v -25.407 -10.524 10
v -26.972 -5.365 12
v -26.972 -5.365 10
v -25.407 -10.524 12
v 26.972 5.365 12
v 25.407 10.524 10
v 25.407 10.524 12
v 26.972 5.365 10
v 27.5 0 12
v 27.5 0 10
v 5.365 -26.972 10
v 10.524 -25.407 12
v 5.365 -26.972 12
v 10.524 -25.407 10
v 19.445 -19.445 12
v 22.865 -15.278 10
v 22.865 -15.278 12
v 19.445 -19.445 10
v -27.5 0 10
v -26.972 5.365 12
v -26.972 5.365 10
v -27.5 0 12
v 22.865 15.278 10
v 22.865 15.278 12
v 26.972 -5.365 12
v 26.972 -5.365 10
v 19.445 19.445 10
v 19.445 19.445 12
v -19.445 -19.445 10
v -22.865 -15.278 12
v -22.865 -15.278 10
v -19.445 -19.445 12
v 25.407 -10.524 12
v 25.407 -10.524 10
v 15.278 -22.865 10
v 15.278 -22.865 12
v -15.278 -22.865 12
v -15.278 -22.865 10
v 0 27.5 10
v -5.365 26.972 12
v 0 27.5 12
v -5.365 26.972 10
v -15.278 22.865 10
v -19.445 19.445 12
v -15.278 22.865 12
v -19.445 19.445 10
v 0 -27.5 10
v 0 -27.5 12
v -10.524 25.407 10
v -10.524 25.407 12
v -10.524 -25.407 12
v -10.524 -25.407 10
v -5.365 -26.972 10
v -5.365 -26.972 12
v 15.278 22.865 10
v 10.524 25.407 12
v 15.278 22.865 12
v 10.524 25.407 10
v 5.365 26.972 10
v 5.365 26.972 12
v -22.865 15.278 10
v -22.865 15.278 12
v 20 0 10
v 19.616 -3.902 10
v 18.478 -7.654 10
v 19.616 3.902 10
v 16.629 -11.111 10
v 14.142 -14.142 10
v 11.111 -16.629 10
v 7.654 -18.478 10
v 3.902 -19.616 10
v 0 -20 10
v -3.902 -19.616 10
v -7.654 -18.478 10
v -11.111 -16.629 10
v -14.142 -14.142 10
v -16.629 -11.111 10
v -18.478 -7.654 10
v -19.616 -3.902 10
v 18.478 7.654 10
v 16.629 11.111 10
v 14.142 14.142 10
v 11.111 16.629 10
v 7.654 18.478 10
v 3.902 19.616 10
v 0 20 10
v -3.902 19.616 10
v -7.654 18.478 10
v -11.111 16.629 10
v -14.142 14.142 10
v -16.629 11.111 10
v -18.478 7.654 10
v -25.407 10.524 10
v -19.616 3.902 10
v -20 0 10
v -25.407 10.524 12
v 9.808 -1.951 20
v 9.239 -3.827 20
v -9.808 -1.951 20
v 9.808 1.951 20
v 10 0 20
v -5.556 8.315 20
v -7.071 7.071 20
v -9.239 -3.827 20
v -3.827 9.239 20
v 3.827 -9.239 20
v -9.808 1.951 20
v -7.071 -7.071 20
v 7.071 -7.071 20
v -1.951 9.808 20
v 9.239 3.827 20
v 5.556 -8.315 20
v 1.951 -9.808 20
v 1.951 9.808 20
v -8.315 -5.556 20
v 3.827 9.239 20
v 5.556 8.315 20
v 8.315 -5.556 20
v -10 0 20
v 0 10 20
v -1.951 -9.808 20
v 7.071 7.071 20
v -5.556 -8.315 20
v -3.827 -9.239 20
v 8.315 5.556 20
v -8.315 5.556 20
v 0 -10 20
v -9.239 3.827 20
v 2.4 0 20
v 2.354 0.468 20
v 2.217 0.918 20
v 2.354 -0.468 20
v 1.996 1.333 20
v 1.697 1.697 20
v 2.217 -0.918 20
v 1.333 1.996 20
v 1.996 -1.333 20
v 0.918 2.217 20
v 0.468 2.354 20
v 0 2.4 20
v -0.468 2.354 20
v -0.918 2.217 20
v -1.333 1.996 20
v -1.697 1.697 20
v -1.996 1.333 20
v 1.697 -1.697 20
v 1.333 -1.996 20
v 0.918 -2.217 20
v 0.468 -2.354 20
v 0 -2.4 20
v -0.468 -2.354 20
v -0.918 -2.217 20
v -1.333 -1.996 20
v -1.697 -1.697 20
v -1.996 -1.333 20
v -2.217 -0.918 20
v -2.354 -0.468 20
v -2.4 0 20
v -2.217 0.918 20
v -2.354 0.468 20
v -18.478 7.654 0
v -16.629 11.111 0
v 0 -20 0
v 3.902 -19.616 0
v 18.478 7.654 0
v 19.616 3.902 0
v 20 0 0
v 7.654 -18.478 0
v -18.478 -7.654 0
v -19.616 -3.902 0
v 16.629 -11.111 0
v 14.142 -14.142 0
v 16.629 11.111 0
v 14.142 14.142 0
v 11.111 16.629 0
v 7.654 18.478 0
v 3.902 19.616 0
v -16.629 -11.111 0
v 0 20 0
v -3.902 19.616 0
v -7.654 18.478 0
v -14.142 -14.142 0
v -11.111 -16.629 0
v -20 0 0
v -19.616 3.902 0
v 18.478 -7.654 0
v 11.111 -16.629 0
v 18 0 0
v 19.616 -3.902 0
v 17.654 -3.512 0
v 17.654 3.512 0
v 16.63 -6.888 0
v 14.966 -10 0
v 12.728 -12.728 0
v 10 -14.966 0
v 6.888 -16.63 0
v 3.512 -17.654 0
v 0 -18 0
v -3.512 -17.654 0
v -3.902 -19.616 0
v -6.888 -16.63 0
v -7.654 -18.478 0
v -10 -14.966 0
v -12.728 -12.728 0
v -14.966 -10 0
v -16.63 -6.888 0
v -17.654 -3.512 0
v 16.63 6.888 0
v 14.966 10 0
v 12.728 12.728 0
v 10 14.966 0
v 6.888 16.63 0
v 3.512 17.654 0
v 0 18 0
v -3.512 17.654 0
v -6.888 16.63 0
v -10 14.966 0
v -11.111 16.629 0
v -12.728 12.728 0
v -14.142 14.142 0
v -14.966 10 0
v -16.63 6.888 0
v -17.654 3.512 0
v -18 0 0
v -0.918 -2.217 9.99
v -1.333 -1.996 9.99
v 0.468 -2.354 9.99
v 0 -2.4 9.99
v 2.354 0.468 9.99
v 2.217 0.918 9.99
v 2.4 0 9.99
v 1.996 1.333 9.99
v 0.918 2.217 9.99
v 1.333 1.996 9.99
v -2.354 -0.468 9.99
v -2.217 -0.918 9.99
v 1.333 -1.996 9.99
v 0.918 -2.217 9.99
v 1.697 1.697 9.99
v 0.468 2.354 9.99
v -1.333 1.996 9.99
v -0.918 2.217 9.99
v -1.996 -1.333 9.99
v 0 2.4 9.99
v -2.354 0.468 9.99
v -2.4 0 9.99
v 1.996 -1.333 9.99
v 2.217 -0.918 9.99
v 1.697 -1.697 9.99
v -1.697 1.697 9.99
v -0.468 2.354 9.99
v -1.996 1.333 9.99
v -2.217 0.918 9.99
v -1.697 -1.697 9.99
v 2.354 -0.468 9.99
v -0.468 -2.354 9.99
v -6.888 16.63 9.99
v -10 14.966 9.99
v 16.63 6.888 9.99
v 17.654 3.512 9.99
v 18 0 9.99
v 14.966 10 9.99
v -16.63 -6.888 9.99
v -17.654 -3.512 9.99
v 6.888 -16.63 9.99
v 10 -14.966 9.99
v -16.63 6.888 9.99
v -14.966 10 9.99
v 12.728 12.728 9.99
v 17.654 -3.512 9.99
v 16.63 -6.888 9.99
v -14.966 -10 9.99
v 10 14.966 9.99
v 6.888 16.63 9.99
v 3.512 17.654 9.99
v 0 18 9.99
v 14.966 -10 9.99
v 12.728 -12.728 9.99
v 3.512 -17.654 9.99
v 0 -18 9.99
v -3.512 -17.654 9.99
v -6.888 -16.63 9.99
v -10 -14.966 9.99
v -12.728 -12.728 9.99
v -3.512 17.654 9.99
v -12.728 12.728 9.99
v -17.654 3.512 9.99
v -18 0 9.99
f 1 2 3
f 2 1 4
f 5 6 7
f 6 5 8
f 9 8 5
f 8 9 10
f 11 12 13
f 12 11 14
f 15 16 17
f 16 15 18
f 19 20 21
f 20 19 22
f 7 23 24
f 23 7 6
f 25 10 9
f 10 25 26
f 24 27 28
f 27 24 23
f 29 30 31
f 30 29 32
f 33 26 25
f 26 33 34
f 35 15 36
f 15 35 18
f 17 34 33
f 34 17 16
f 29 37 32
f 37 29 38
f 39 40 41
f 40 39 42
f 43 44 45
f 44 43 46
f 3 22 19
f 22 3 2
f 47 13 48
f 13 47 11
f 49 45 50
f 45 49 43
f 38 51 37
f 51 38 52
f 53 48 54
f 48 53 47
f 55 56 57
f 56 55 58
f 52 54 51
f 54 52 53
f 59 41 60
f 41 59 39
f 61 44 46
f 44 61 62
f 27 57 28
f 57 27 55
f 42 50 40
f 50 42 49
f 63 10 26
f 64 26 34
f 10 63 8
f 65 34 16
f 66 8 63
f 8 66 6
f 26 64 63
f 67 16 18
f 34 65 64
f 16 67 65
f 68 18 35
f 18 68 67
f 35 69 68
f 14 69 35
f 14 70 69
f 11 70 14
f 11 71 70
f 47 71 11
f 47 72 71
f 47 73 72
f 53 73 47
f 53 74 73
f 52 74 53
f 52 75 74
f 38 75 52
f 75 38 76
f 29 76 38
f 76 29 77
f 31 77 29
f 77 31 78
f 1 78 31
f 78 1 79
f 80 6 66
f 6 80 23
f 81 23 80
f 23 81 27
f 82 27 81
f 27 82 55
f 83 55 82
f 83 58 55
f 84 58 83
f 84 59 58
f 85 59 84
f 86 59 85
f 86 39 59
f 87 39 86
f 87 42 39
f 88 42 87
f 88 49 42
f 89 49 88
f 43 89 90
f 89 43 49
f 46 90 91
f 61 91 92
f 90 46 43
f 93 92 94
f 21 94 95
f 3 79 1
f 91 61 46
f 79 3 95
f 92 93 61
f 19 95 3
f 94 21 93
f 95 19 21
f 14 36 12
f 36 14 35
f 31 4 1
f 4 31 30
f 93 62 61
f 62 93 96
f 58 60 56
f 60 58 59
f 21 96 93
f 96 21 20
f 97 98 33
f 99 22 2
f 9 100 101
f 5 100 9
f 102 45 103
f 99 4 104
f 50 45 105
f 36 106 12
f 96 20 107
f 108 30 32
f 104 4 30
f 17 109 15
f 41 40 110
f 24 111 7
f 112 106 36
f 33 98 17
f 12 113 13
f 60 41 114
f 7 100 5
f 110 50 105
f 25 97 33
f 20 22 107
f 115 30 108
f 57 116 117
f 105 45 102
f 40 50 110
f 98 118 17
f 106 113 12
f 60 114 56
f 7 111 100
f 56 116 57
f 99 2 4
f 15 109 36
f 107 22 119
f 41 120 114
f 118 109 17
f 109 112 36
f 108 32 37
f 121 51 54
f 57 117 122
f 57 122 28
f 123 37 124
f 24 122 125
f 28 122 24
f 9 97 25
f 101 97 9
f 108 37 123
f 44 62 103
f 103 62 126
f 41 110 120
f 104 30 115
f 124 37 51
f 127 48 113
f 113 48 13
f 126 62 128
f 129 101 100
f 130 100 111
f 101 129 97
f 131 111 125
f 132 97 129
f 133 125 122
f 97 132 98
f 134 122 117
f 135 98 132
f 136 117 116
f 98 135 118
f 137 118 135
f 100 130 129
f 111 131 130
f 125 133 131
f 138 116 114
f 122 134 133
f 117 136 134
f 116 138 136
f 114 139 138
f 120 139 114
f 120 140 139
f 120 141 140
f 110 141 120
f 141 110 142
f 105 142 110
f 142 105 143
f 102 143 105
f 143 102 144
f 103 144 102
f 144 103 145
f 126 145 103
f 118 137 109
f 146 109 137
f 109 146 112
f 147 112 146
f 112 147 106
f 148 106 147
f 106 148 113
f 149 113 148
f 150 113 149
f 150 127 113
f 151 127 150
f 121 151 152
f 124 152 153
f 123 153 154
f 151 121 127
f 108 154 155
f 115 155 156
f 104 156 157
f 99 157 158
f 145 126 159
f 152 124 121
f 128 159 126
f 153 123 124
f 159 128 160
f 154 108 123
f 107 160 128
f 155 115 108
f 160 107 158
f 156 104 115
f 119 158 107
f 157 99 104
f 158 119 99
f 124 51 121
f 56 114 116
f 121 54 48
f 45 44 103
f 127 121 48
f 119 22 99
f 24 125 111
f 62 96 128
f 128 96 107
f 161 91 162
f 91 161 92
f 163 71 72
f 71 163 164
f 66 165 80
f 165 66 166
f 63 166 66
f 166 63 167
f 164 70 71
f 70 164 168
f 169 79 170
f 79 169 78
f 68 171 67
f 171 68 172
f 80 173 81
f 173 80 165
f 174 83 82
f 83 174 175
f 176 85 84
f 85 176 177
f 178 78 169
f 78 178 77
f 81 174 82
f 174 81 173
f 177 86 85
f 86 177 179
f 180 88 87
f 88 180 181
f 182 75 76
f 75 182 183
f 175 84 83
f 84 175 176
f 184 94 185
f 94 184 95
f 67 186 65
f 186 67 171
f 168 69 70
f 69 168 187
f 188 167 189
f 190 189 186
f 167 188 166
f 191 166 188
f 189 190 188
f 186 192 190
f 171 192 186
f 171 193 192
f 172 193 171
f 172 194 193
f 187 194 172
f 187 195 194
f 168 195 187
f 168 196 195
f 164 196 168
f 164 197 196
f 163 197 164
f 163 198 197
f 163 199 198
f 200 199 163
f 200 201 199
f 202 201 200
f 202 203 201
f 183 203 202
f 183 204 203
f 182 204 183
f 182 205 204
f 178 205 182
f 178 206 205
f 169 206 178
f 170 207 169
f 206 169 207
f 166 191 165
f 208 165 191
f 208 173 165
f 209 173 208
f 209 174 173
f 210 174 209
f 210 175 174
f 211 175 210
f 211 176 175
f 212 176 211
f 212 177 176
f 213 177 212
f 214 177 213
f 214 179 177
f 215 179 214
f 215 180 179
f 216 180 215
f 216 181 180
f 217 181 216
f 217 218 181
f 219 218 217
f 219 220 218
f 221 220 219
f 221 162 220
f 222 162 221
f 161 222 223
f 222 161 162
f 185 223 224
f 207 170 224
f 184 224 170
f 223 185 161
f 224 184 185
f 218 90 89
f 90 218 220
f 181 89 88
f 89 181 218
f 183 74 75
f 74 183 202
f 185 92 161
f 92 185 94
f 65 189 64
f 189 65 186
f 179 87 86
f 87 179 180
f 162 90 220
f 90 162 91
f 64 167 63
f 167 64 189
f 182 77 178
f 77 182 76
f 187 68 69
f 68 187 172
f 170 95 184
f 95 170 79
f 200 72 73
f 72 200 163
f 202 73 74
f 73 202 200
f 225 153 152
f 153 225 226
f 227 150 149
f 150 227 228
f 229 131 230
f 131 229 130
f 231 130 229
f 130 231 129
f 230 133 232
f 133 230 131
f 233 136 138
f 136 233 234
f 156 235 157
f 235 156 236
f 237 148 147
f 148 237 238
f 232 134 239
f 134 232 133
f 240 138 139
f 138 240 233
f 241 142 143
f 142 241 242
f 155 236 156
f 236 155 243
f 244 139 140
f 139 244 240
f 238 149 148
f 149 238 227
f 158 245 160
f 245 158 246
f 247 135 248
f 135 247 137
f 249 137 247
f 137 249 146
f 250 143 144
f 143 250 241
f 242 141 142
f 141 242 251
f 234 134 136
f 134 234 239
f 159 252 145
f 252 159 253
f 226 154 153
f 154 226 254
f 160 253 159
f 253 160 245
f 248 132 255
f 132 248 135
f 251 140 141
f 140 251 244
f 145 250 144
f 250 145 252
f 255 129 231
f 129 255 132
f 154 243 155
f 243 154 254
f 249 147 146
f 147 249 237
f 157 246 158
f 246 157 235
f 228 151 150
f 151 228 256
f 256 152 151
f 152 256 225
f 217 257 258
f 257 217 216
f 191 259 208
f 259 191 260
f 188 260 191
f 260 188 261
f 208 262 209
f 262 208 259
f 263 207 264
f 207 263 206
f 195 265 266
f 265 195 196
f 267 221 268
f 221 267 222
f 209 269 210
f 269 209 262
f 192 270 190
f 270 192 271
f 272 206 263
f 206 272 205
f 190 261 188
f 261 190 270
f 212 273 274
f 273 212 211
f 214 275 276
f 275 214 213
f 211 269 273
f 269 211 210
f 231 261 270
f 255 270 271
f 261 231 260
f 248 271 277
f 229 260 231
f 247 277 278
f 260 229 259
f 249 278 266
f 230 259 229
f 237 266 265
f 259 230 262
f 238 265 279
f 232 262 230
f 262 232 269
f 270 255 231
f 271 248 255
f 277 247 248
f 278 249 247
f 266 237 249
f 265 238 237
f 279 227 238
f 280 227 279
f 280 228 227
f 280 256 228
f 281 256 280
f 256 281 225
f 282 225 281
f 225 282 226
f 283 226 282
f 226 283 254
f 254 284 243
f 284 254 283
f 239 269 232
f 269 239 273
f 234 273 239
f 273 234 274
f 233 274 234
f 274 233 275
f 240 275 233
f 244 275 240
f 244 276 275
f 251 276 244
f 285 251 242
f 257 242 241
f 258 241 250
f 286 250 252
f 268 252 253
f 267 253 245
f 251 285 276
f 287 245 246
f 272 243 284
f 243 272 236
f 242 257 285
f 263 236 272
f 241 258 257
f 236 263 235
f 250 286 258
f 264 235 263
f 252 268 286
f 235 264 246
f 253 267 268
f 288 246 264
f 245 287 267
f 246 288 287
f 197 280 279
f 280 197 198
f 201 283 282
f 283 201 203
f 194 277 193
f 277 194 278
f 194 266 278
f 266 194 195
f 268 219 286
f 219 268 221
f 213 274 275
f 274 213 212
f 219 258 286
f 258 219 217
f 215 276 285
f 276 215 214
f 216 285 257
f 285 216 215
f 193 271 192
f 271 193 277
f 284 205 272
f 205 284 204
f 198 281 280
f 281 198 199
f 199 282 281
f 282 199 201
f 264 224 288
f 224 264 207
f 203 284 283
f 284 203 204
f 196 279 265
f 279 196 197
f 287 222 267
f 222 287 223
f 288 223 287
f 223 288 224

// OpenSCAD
thickness = 20; //mm
inside_diameter = 40; //mm
ring_diameter = inside_diameter + 15; //mm
ring_thickness = 2; //mm
screw_diameter = 4.8; //mm
wall_thickness = ring_thickness; //mm

$fn=32;


difference() {
  union() {
    cylinder(d=inside_diameter, h=thickness / 2);
    translate([0,0,thickness / 2]) {
      cylinder(d=ring_diameter, h=ring_thickness);
      translate([0,0,ring_thickness]) {
        cylinder(d1=ring_diameter, d2=inside_diameter / 2, h=thickness / 2 - ring_thickness);
      }
    }
  }
  translate([0, 0, -0.01]) {
    cylinder(d=screw_diameter, h=thickness + 0.02);
    cylinder(d=inside_diameter- 2 * wall_thickness, h=thickness / 2);
  }
}
